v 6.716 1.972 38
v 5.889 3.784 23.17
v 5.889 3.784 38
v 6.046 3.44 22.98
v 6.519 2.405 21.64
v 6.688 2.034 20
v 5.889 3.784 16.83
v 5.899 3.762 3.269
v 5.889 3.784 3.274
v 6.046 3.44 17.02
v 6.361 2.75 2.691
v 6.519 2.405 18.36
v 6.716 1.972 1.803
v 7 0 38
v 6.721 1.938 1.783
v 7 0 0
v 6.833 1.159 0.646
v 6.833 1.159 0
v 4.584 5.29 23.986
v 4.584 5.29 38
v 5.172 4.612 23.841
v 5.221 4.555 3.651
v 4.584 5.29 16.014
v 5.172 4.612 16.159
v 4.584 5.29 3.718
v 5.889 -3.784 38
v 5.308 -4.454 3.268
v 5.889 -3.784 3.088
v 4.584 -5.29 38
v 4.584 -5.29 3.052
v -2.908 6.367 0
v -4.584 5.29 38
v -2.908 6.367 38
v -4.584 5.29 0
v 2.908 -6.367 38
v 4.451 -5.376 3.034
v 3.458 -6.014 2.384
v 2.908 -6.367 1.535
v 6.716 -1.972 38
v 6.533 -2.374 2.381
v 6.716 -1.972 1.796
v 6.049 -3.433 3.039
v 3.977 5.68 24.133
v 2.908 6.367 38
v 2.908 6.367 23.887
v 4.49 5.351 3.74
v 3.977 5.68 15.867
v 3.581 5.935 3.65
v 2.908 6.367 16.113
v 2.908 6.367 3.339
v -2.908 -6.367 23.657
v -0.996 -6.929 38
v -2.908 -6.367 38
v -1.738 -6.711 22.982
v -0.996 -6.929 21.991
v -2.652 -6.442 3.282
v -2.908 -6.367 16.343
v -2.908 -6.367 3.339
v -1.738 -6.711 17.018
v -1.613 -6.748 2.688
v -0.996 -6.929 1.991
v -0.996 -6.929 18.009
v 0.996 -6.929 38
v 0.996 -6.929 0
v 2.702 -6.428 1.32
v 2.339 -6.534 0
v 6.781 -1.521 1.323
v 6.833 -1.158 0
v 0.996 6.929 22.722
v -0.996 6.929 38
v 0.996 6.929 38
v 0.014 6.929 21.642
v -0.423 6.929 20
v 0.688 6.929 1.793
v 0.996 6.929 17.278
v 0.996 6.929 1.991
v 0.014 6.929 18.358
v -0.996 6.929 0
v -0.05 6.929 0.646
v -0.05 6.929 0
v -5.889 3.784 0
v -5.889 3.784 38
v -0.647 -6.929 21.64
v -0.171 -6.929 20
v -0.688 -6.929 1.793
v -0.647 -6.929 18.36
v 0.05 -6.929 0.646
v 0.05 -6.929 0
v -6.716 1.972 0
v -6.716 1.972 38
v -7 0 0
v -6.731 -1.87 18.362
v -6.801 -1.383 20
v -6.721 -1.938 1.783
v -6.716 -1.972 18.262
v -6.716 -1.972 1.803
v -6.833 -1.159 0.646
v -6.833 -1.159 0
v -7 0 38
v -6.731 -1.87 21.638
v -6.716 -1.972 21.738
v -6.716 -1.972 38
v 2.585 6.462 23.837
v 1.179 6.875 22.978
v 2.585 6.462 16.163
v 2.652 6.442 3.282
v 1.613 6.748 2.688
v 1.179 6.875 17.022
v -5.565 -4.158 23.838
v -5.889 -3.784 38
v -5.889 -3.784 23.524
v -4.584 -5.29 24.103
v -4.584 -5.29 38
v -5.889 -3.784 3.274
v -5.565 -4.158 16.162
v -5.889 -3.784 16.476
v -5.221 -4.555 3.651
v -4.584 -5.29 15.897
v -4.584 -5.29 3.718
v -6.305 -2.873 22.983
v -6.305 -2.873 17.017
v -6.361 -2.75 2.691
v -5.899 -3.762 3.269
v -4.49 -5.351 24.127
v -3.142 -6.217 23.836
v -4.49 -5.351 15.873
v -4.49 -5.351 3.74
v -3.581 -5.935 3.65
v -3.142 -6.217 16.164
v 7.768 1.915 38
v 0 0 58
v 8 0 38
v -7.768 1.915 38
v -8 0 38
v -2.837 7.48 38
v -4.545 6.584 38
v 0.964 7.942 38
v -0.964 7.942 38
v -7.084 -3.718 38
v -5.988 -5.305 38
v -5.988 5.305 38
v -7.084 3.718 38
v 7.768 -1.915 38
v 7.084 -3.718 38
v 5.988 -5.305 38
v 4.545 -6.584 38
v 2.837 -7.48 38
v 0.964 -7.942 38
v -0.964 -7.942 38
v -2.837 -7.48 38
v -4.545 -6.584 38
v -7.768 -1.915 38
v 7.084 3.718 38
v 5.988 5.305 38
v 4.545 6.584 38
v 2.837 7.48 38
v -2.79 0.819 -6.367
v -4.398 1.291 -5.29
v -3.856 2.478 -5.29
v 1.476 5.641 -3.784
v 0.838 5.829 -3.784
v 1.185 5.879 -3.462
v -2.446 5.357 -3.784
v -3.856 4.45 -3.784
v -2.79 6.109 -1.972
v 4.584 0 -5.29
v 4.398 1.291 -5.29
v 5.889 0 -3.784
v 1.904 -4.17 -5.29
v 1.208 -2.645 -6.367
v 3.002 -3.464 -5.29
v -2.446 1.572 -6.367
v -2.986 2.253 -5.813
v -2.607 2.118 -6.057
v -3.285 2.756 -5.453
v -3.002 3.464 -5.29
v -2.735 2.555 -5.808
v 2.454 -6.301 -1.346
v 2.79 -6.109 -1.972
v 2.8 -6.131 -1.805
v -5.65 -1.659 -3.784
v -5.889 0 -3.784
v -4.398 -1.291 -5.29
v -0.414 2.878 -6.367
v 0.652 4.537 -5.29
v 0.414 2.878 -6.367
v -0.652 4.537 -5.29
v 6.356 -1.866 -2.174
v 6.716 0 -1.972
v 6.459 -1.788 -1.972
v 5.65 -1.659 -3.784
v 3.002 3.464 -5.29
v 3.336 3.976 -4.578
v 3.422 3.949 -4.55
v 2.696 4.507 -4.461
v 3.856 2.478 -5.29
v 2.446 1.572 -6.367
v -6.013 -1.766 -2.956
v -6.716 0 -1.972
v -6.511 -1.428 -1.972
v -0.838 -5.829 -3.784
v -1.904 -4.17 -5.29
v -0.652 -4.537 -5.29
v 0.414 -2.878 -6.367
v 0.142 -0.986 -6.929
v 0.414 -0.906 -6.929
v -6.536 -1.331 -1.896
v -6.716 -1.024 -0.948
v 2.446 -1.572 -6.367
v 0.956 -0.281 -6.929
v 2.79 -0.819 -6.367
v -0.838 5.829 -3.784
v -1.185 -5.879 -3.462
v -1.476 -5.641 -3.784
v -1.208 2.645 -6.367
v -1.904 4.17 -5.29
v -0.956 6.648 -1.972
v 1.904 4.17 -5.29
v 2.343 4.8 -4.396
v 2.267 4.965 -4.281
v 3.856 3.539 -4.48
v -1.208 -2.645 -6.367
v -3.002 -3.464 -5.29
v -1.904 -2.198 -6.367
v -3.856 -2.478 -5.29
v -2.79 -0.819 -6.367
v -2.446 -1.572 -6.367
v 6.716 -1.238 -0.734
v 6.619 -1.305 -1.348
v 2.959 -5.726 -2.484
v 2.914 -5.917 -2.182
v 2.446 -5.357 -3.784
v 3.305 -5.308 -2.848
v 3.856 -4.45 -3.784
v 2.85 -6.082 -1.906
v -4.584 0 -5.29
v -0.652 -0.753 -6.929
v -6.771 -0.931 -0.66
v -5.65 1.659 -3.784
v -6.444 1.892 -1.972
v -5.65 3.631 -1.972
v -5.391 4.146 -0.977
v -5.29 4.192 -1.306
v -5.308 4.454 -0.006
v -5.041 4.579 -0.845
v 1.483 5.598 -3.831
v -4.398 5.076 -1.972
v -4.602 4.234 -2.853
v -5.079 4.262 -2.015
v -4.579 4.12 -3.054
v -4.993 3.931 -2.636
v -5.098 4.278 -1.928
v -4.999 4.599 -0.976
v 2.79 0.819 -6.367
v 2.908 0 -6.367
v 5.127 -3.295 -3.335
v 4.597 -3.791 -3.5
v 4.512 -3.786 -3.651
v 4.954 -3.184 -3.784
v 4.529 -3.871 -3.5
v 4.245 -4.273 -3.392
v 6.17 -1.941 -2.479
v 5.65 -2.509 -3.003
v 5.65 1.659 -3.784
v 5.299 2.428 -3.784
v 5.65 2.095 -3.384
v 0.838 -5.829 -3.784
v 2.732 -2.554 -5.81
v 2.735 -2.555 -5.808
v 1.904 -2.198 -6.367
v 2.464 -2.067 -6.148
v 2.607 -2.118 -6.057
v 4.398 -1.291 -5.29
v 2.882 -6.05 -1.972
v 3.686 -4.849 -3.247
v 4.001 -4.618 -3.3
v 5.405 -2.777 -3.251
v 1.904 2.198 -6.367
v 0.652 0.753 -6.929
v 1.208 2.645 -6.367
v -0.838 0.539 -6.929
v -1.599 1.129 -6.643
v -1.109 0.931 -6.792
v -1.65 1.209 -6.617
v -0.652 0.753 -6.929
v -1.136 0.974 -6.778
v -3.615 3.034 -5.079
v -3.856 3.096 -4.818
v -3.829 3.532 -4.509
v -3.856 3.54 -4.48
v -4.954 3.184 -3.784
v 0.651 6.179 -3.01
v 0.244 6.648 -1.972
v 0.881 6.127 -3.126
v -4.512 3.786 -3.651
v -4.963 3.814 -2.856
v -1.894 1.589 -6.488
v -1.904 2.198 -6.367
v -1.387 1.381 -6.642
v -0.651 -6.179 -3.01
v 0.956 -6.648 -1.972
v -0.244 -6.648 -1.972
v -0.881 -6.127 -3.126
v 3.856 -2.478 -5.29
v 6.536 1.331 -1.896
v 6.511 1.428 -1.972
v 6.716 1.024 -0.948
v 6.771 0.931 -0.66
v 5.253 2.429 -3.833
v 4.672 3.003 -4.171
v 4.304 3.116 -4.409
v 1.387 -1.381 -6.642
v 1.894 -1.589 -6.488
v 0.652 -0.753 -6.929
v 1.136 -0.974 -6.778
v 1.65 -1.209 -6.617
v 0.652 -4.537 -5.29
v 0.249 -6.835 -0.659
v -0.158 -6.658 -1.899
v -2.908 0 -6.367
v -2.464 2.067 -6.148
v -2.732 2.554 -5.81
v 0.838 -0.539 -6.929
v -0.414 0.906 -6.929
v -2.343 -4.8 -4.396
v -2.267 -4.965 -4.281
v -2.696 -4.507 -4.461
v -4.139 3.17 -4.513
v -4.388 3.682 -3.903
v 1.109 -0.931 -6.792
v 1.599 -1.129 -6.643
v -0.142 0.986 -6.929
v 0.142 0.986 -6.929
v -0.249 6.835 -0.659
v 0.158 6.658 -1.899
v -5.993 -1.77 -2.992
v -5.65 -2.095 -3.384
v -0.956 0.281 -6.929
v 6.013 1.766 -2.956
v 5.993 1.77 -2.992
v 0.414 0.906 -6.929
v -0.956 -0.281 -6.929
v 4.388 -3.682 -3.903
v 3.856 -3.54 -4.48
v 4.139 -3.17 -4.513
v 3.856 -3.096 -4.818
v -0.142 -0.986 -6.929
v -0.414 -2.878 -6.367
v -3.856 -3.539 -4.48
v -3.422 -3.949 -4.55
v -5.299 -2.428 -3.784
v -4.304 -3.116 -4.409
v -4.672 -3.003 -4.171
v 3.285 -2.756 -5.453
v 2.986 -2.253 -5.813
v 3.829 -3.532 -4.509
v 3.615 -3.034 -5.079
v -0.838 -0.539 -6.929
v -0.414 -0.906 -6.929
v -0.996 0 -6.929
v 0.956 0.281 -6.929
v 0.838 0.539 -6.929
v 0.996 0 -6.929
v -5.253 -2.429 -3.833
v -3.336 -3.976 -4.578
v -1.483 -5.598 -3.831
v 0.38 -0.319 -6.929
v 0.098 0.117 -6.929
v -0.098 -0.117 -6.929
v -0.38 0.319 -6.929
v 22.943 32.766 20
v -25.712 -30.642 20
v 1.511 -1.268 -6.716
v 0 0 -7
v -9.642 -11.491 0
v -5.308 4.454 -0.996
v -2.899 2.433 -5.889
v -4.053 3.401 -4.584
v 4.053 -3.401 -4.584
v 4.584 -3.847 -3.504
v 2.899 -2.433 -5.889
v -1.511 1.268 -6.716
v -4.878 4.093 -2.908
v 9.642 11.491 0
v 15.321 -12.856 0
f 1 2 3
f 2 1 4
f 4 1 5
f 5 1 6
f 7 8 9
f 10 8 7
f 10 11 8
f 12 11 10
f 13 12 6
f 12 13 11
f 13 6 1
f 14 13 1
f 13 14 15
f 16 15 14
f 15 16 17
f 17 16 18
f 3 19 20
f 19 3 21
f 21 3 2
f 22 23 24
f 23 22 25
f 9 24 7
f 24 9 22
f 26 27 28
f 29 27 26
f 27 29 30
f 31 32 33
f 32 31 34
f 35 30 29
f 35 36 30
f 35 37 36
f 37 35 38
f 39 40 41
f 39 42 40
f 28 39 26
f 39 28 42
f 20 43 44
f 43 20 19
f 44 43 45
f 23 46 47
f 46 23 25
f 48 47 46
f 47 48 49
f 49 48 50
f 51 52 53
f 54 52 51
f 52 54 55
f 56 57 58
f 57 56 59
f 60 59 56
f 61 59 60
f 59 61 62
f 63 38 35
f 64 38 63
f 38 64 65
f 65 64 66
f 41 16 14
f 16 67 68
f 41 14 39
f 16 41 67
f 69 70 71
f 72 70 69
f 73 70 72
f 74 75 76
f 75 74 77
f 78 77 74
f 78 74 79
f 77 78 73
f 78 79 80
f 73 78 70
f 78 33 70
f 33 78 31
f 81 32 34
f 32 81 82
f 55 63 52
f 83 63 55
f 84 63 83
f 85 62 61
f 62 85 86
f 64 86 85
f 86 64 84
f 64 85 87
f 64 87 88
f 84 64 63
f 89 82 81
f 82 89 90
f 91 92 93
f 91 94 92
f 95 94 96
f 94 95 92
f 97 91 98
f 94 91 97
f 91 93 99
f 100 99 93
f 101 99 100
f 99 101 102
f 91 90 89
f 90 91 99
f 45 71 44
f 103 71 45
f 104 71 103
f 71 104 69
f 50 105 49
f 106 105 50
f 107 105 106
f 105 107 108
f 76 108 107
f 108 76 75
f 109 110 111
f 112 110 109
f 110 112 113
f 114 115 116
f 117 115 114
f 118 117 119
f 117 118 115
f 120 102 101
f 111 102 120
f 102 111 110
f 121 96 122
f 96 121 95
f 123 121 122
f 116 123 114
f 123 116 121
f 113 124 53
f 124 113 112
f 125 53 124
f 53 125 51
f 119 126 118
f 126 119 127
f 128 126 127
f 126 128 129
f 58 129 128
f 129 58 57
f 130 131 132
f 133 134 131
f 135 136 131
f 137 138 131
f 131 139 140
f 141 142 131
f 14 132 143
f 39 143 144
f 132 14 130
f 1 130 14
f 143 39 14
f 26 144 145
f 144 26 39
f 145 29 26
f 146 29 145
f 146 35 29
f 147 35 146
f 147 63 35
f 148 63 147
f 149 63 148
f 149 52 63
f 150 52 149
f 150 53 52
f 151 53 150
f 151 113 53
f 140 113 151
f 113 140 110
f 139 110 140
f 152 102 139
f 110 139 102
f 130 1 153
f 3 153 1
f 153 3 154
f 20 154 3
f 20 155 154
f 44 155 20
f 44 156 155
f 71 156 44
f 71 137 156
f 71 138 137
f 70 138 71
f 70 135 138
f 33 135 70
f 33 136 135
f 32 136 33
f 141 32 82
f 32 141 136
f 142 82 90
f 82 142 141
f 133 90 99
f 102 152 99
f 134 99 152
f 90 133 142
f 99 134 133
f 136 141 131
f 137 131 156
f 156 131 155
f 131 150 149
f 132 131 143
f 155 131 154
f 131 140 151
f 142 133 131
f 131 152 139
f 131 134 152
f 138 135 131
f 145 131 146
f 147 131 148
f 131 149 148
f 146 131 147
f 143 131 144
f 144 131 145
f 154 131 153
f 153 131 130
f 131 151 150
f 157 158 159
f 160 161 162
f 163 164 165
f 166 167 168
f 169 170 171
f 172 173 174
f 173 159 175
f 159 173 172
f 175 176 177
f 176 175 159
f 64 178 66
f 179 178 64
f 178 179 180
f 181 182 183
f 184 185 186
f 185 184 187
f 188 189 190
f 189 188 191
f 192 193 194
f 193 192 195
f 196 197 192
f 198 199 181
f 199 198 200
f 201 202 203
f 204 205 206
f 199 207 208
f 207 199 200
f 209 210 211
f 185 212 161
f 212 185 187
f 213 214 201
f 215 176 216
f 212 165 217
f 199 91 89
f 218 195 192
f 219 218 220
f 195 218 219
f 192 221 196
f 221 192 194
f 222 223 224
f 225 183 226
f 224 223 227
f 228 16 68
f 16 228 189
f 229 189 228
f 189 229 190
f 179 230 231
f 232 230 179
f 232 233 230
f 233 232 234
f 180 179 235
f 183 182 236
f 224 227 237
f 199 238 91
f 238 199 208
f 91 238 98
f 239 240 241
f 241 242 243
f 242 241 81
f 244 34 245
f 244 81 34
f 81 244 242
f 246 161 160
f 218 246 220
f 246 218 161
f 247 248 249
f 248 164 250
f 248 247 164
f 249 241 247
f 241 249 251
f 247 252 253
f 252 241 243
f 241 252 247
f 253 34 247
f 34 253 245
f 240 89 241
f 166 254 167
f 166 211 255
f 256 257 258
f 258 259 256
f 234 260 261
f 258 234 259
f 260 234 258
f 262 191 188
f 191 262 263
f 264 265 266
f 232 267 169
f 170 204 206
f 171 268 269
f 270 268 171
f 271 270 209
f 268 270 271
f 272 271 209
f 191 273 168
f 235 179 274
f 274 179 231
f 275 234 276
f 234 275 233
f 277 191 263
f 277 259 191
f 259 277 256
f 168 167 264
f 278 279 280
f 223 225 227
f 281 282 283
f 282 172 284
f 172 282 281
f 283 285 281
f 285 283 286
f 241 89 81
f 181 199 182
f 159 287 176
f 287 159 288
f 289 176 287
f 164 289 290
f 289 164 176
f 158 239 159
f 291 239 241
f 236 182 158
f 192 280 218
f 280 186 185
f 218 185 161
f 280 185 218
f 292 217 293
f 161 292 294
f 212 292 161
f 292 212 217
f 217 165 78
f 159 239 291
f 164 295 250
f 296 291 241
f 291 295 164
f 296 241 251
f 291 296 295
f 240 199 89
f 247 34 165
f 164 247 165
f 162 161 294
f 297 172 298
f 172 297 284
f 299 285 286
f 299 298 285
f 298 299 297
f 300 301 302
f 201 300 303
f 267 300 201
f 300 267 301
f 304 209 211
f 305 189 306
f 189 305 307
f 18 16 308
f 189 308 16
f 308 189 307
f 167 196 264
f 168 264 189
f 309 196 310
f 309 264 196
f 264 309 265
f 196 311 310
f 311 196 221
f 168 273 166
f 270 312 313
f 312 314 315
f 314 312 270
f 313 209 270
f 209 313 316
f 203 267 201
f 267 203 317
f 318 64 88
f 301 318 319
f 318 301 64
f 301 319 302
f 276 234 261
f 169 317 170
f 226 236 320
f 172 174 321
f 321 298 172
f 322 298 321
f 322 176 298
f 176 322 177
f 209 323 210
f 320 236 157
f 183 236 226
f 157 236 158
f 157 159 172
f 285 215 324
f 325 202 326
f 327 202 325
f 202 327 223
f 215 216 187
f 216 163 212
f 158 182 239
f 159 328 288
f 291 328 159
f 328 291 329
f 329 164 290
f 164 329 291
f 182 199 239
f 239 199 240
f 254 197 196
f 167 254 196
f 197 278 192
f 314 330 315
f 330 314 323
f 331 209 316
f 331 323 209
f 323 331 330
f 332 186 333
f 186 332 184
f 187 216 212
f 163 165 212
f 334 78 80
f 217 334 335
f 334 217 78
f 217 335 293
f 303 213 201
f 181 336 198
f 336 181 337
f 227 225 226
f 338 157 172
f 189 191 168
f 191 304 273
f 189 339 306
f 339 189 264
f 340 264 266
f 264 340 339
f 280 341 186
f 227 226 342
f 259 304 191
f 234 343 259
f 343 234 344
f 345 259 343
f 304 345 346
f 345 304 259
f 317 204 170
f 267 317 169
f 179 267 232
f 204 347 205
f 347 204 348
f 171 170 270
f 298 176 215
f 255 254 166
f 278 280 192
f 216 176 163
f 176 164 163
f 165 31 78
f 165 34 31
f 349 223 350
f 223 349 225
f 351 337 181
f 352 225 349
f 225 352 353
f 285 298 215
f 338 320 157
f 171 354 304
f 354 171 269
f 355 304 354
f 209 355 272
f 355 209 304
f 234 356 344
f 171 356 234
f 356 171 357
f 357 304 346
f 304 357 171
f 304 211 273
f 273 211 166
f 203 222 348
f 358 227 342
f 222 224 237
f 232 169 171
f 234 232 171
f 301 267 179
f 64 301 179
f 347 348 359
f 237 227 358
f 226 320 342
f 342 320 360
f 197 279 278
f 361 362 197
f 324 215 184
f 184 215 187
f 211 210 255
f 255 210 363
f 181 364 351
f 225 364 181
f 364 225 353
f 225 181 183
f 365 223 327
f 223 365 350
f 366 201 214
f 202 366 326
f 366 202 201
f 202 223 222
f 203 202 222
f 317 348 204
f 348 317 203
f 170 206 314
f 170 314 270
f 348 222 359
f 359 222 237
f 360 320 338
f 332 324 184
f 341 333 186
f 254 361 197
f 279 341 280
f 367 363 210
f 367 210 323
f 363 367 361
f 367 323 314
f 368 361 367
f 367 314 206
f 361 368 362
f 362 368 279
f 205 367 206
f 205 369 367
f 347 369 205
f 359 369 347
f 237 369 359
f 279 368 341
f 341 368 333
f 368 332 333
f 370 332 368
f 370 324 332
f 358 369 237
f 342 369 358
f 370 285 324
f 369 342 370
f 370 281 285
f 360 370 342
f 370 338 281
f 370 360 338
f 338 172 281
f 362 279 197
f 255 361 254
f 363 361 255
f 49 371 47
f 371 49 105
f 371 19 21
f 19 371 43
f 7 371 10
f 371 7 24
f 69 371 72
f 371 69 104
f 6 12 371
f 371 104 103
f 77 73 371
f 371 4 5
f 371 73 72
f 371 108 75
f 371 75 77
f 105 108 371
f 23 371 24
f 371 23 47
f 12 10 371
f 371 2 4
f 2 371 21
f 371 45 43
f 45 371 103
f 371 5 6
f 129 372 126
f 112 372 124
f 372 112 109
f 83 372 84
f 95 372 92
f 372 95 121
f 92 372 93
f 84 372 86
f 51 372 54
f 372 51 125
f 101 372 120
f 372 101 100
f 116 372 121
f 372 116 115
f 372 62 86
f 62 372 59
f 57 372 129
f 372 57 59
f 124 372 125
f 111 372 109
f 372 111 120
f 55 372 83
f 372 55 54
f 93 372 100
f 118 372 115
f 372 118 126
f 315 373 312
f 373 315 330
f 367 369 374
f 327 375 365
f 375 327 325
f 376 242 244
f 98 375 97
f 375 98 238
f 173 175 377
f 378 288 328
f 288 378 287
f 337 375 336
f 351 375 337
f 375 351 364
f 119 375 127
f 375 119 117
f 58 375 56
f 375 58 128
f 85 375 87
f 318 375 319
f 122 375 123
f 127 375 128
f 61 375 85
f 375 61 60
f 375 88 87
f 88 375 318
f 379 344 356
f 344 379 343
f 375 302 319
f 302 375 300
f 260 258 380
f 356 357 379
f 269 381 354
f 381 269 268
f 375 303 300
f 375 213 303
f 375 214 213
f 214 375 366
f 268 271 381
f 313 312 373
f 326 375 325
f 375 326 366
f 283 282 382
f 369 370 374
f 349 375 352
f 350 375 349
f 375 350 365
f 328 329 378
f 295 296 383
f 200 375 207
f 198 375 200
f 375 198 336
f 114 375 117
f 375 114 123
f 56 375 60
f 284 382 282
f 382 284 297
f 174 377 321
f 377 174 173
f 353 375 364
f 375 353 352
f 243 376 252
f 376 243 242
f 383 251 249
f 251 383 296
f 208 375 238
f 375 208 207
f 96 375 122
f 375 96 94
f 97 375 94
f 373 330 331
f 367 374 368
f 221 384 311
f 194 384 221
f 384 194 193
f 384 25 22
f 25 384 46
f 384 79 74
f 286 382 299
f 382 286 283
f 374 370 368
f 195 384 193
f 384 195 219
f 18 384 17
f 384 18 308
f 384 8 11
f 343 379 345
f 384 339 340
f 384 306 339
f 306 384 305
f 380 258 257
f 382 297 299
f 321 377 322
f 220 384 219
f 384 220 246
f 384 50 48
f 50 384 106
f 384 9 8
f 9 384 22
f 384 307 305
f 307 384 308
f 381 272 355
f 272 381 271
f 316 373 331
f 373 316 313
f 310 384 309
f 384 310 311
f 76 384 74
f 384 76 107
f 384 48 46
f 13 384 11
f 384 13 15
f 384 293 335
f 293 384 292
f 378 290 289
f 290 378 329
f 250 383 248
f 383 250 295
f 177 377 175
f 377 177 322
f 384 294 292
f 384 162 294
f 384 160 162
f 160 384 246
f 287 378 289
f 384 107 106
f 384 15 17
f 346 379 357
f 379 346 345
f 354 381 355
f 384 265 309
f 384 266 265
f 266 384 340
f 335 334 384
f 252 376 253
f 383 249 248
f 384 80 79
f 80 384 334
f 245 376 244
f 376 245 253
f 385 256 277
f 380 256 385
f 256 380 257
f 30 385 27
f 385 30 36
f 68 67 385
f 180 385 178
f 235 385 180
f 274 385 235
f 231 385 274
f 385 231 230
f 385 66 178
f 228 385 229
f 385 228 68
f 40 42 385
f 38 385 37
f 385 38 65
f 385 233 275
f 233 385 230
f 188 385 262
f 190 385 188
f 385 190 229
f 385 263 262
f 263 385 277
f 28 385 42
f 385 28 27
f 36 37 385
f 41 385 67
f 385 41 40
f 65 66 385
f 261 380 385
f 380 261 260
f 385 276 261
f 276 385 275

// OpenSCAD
cylinder(40,7,7);
translate([0,0,38])
cylinder(20,8,0);
sphere(7);
rotate([90,90,145])
translate([-20,0,0])
cylinder(40,5,0);
rotate([220,90,90])
translate([-20,0,0])
cylinder(40,5,0);
rotate([220,90,90])
cylinder(15,7,0);
rotate([-140,90,90])
translate([0,0,-15])
cylinder(15,0,7);
translate([0,0,0])
rotate([130,90,90])
cylinder(20,5,0);
